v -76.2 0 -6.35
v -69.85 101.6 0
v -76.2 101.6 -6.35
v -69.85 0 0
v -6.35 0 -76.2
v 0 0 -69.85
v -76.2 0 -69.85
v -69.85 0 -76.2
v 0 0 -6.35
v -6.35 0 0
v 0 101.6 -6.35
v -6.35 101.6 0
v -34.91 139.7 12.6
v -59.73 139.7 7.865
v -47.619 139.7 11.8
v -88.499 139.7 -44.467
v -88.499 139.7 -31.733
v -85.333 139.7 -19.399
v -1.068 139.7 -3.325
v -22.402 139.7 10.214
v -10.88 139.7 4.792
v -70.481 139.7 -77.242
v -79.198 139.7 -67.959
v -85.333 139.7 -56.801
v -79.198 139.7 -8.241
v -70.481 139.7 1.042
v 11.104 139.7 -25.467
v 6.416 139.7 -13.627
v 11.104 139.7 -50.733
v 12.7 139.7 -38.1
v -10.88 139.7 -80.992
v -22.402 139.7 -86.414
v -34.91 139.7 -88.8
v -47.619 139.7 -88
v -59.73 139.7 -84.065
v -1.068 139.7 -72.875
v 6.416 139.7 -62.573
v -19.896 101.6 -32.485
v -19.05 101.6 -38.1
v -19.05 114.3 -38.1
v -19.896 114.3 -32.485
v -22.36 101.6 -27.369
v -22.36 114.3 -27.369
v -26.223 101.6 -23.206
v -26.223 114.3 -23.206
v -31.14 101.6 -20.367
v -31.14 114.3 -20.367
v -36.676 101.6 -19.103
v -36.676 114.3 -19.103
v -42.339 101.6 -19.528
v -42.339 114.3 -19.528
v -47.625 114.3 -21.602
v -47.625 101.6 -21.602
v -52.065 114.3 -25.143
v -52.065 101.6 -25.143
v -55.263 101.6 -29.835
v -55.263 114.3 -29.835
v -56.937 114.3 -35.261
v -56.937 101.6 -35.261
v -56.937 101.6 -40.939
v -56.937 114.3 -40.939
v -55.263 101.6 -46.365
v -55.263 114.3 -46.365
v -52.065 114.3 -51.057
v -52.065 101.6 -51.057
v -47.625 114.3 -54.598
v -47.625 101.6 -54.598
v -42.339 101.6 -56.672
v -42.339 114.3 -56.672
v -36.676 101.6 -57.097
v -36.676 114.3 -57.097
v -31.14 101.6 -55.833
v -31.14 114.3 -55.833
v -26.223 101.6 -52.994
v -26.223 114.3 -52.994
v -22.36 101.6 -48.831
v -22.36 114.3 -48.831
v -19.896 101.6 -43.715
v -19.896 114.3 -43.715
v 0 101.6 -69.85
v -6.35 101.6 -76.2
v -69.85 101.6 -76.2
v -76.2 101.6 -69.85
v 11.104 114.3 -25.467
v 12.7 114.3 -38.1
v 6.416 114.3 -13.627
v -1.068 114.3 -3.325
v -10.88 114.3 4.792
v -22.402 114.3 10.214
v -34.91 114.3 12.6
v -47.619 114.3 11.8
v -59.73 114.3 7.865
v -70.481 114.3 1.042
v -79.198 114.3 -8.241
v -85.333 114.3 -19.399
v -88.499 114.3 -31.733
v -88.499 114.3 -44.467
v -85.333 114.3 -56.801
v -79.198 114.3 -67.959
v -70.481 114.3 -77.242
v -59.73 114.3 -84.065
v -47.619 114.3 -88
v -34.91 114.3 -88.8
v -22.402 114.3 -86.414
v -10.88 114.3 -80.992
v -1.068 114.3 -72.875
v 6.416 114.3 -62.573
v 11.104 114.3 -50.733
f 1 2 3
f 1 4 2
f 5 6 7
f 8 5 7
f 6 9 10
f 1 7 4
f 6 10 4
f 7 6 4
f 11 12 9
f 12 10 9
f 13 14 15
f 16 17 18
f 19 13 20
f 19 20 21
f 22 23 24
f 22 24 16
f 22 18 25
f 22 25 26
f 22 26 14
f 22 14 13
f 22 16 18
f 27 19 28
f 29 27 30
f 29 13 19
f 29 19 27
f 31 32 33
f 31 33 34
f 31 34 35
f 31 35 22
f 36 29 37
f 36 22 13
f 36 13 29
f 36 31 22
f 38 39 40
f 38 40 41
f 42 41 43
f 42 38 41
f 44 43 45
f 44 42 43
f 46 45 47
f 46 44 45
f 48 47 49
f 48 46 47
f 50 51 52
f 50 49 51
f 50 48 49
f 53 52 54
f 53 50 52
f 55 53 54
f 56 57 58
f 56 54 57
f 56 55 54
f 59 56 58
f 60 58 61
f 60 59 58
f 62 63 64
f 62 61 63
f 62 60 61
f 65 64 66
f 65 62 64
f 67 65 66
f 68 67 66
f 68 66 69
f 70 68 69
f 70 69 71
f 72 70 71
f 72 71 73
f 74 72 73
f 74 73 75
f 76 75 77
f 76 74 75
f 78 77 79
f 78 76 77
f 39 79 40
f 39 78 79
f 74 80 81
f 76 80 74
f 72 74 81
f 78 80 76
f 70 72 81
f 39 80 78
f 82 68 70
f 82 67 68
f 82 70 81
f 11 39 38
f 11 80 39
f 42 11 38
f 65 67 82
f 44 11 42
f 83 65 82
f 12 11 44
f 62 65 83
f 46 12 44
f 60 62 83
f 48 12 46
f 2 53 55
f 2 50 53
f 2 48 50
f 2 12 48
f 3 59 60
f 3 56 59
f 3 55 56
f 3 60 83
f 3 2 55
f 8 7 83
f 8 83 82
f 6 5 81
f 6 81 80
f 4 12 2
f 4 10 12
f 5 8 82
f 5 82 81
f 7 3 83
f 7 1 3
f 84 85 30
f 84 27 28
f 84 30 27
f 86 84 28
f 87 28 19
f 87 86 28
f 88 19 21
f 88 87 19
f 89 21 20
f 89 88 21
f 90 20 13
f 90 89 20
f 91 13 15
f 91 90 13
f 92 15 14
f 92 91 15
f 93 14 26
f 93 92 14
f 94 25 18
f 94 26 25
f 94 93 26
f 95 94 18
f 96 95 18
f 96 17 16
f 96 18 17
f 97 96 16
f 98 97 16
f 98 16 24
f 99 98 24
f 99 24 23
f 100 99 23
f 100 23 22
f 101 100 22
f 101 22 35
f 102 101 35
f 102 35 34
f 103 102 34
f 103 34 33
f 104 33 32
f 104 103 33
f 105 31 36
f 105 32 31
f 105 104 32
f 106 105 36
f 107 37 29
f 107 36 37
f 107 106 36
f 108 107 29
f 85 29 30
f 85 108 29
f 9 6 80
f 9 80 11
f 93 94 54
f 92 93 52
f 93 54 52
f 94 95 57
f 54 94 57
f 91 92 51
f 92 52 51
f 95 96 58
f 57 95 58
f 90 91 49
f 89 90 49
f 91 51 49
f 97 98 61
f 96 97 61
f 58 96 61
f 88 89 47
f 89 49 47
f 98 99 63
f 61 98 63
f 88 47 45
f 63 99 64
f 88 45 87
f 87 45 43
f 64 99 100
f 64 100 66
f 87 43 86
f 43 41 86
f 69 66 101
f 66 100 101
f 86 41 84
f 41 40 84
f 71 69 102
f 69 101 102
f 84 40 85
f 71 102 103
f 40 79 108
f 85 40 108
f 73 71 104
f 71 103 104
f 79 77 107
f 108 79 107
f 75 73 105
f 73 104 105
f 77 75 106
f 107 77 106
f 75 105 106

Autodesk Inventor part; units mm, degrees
ref_plane "YZ Plane" through (0, 0, 0) normal (1, 0, 0) x (0, 1, 0)
ref_plane "XZ Plane" through (0, 0, 0) normal (0, 1, 0) x (-1, 0, 0)
ref_plane "XY Plane" through (0, 0, 0) normal (0, 0, 1) x (1, 0, 0)
sketch "Sketch1" plane through (0, 0, 0) normal (0, 1, 0) x (-1, 0, 0)
  line L0 (6.35, 0) -> (69.85, 0)
  line L1 (76.2, -6.35) -> (76.2, -69.85)
  line L2 (69.85, -76.2) -> (6.35, -76.2)
  line L3 (0, -69.85) -> (0, -6.35)
  line L4 (69.85, 0) -> (76.2, -6.35)
  line L5 (76.2, -69.85) -> (69.85, -76.2)
  line L6 (6.35, 0) -> (0, -6.35)
  line L7 (6.35, -76.2) -> (0, -69.85)
  point P0 (0, 0)
  point P1 (76.2, -76.2)
  point P2 (76.2, 0)
  point P3 (0, -76.2)
  dimension "d2" = 76.2
  dimension "d3" = 76.2
  dimension "d4" = 6.35
  dimension "d5" = 6.35
  dimension "d6" = 6.35
  dimension "d7" = 6.35
  dimension "d8" = 6.35
  dimension "d9" = 6.35
  dimension "d10" = 6.35
  dimension "d11" = 6.35
extrude "Extrusion1" add sketch "Sketch1" along normal blind 101.6
sketch "Sketch2" plane through (0, 101.6, 0) normal (0, 1, 0) x (1, 0, 0)
  circle A0 centre (-38.1, 38.1) radius 19.05
  line L0 (-69.85, 0) -> (-6.35, 0) projected
  line L1 (0, 6.35) -> (0, 69.85) projected
  point P0 (0, 0)
  dimension "d14" = 38.1
  dimension "d15" = 38.1
  dimension "d16" = 38.1
extrude "Extrusion2" add sketch "Sketch2" along normal blind 12.7
sketch "Sketch3" plane through (-38.1, 114.3, -38.1) normal (0, 1, 0) x (1, 0, 0)
  circle A0 centre (0, 0) radius 50.8
  point P0 (38.1, -38.1)
  dimension "d19" = 101.6
extrude "Extrusion3" add sketch "Sketch3" along normal blind 25.4
properties part number "Motor"
